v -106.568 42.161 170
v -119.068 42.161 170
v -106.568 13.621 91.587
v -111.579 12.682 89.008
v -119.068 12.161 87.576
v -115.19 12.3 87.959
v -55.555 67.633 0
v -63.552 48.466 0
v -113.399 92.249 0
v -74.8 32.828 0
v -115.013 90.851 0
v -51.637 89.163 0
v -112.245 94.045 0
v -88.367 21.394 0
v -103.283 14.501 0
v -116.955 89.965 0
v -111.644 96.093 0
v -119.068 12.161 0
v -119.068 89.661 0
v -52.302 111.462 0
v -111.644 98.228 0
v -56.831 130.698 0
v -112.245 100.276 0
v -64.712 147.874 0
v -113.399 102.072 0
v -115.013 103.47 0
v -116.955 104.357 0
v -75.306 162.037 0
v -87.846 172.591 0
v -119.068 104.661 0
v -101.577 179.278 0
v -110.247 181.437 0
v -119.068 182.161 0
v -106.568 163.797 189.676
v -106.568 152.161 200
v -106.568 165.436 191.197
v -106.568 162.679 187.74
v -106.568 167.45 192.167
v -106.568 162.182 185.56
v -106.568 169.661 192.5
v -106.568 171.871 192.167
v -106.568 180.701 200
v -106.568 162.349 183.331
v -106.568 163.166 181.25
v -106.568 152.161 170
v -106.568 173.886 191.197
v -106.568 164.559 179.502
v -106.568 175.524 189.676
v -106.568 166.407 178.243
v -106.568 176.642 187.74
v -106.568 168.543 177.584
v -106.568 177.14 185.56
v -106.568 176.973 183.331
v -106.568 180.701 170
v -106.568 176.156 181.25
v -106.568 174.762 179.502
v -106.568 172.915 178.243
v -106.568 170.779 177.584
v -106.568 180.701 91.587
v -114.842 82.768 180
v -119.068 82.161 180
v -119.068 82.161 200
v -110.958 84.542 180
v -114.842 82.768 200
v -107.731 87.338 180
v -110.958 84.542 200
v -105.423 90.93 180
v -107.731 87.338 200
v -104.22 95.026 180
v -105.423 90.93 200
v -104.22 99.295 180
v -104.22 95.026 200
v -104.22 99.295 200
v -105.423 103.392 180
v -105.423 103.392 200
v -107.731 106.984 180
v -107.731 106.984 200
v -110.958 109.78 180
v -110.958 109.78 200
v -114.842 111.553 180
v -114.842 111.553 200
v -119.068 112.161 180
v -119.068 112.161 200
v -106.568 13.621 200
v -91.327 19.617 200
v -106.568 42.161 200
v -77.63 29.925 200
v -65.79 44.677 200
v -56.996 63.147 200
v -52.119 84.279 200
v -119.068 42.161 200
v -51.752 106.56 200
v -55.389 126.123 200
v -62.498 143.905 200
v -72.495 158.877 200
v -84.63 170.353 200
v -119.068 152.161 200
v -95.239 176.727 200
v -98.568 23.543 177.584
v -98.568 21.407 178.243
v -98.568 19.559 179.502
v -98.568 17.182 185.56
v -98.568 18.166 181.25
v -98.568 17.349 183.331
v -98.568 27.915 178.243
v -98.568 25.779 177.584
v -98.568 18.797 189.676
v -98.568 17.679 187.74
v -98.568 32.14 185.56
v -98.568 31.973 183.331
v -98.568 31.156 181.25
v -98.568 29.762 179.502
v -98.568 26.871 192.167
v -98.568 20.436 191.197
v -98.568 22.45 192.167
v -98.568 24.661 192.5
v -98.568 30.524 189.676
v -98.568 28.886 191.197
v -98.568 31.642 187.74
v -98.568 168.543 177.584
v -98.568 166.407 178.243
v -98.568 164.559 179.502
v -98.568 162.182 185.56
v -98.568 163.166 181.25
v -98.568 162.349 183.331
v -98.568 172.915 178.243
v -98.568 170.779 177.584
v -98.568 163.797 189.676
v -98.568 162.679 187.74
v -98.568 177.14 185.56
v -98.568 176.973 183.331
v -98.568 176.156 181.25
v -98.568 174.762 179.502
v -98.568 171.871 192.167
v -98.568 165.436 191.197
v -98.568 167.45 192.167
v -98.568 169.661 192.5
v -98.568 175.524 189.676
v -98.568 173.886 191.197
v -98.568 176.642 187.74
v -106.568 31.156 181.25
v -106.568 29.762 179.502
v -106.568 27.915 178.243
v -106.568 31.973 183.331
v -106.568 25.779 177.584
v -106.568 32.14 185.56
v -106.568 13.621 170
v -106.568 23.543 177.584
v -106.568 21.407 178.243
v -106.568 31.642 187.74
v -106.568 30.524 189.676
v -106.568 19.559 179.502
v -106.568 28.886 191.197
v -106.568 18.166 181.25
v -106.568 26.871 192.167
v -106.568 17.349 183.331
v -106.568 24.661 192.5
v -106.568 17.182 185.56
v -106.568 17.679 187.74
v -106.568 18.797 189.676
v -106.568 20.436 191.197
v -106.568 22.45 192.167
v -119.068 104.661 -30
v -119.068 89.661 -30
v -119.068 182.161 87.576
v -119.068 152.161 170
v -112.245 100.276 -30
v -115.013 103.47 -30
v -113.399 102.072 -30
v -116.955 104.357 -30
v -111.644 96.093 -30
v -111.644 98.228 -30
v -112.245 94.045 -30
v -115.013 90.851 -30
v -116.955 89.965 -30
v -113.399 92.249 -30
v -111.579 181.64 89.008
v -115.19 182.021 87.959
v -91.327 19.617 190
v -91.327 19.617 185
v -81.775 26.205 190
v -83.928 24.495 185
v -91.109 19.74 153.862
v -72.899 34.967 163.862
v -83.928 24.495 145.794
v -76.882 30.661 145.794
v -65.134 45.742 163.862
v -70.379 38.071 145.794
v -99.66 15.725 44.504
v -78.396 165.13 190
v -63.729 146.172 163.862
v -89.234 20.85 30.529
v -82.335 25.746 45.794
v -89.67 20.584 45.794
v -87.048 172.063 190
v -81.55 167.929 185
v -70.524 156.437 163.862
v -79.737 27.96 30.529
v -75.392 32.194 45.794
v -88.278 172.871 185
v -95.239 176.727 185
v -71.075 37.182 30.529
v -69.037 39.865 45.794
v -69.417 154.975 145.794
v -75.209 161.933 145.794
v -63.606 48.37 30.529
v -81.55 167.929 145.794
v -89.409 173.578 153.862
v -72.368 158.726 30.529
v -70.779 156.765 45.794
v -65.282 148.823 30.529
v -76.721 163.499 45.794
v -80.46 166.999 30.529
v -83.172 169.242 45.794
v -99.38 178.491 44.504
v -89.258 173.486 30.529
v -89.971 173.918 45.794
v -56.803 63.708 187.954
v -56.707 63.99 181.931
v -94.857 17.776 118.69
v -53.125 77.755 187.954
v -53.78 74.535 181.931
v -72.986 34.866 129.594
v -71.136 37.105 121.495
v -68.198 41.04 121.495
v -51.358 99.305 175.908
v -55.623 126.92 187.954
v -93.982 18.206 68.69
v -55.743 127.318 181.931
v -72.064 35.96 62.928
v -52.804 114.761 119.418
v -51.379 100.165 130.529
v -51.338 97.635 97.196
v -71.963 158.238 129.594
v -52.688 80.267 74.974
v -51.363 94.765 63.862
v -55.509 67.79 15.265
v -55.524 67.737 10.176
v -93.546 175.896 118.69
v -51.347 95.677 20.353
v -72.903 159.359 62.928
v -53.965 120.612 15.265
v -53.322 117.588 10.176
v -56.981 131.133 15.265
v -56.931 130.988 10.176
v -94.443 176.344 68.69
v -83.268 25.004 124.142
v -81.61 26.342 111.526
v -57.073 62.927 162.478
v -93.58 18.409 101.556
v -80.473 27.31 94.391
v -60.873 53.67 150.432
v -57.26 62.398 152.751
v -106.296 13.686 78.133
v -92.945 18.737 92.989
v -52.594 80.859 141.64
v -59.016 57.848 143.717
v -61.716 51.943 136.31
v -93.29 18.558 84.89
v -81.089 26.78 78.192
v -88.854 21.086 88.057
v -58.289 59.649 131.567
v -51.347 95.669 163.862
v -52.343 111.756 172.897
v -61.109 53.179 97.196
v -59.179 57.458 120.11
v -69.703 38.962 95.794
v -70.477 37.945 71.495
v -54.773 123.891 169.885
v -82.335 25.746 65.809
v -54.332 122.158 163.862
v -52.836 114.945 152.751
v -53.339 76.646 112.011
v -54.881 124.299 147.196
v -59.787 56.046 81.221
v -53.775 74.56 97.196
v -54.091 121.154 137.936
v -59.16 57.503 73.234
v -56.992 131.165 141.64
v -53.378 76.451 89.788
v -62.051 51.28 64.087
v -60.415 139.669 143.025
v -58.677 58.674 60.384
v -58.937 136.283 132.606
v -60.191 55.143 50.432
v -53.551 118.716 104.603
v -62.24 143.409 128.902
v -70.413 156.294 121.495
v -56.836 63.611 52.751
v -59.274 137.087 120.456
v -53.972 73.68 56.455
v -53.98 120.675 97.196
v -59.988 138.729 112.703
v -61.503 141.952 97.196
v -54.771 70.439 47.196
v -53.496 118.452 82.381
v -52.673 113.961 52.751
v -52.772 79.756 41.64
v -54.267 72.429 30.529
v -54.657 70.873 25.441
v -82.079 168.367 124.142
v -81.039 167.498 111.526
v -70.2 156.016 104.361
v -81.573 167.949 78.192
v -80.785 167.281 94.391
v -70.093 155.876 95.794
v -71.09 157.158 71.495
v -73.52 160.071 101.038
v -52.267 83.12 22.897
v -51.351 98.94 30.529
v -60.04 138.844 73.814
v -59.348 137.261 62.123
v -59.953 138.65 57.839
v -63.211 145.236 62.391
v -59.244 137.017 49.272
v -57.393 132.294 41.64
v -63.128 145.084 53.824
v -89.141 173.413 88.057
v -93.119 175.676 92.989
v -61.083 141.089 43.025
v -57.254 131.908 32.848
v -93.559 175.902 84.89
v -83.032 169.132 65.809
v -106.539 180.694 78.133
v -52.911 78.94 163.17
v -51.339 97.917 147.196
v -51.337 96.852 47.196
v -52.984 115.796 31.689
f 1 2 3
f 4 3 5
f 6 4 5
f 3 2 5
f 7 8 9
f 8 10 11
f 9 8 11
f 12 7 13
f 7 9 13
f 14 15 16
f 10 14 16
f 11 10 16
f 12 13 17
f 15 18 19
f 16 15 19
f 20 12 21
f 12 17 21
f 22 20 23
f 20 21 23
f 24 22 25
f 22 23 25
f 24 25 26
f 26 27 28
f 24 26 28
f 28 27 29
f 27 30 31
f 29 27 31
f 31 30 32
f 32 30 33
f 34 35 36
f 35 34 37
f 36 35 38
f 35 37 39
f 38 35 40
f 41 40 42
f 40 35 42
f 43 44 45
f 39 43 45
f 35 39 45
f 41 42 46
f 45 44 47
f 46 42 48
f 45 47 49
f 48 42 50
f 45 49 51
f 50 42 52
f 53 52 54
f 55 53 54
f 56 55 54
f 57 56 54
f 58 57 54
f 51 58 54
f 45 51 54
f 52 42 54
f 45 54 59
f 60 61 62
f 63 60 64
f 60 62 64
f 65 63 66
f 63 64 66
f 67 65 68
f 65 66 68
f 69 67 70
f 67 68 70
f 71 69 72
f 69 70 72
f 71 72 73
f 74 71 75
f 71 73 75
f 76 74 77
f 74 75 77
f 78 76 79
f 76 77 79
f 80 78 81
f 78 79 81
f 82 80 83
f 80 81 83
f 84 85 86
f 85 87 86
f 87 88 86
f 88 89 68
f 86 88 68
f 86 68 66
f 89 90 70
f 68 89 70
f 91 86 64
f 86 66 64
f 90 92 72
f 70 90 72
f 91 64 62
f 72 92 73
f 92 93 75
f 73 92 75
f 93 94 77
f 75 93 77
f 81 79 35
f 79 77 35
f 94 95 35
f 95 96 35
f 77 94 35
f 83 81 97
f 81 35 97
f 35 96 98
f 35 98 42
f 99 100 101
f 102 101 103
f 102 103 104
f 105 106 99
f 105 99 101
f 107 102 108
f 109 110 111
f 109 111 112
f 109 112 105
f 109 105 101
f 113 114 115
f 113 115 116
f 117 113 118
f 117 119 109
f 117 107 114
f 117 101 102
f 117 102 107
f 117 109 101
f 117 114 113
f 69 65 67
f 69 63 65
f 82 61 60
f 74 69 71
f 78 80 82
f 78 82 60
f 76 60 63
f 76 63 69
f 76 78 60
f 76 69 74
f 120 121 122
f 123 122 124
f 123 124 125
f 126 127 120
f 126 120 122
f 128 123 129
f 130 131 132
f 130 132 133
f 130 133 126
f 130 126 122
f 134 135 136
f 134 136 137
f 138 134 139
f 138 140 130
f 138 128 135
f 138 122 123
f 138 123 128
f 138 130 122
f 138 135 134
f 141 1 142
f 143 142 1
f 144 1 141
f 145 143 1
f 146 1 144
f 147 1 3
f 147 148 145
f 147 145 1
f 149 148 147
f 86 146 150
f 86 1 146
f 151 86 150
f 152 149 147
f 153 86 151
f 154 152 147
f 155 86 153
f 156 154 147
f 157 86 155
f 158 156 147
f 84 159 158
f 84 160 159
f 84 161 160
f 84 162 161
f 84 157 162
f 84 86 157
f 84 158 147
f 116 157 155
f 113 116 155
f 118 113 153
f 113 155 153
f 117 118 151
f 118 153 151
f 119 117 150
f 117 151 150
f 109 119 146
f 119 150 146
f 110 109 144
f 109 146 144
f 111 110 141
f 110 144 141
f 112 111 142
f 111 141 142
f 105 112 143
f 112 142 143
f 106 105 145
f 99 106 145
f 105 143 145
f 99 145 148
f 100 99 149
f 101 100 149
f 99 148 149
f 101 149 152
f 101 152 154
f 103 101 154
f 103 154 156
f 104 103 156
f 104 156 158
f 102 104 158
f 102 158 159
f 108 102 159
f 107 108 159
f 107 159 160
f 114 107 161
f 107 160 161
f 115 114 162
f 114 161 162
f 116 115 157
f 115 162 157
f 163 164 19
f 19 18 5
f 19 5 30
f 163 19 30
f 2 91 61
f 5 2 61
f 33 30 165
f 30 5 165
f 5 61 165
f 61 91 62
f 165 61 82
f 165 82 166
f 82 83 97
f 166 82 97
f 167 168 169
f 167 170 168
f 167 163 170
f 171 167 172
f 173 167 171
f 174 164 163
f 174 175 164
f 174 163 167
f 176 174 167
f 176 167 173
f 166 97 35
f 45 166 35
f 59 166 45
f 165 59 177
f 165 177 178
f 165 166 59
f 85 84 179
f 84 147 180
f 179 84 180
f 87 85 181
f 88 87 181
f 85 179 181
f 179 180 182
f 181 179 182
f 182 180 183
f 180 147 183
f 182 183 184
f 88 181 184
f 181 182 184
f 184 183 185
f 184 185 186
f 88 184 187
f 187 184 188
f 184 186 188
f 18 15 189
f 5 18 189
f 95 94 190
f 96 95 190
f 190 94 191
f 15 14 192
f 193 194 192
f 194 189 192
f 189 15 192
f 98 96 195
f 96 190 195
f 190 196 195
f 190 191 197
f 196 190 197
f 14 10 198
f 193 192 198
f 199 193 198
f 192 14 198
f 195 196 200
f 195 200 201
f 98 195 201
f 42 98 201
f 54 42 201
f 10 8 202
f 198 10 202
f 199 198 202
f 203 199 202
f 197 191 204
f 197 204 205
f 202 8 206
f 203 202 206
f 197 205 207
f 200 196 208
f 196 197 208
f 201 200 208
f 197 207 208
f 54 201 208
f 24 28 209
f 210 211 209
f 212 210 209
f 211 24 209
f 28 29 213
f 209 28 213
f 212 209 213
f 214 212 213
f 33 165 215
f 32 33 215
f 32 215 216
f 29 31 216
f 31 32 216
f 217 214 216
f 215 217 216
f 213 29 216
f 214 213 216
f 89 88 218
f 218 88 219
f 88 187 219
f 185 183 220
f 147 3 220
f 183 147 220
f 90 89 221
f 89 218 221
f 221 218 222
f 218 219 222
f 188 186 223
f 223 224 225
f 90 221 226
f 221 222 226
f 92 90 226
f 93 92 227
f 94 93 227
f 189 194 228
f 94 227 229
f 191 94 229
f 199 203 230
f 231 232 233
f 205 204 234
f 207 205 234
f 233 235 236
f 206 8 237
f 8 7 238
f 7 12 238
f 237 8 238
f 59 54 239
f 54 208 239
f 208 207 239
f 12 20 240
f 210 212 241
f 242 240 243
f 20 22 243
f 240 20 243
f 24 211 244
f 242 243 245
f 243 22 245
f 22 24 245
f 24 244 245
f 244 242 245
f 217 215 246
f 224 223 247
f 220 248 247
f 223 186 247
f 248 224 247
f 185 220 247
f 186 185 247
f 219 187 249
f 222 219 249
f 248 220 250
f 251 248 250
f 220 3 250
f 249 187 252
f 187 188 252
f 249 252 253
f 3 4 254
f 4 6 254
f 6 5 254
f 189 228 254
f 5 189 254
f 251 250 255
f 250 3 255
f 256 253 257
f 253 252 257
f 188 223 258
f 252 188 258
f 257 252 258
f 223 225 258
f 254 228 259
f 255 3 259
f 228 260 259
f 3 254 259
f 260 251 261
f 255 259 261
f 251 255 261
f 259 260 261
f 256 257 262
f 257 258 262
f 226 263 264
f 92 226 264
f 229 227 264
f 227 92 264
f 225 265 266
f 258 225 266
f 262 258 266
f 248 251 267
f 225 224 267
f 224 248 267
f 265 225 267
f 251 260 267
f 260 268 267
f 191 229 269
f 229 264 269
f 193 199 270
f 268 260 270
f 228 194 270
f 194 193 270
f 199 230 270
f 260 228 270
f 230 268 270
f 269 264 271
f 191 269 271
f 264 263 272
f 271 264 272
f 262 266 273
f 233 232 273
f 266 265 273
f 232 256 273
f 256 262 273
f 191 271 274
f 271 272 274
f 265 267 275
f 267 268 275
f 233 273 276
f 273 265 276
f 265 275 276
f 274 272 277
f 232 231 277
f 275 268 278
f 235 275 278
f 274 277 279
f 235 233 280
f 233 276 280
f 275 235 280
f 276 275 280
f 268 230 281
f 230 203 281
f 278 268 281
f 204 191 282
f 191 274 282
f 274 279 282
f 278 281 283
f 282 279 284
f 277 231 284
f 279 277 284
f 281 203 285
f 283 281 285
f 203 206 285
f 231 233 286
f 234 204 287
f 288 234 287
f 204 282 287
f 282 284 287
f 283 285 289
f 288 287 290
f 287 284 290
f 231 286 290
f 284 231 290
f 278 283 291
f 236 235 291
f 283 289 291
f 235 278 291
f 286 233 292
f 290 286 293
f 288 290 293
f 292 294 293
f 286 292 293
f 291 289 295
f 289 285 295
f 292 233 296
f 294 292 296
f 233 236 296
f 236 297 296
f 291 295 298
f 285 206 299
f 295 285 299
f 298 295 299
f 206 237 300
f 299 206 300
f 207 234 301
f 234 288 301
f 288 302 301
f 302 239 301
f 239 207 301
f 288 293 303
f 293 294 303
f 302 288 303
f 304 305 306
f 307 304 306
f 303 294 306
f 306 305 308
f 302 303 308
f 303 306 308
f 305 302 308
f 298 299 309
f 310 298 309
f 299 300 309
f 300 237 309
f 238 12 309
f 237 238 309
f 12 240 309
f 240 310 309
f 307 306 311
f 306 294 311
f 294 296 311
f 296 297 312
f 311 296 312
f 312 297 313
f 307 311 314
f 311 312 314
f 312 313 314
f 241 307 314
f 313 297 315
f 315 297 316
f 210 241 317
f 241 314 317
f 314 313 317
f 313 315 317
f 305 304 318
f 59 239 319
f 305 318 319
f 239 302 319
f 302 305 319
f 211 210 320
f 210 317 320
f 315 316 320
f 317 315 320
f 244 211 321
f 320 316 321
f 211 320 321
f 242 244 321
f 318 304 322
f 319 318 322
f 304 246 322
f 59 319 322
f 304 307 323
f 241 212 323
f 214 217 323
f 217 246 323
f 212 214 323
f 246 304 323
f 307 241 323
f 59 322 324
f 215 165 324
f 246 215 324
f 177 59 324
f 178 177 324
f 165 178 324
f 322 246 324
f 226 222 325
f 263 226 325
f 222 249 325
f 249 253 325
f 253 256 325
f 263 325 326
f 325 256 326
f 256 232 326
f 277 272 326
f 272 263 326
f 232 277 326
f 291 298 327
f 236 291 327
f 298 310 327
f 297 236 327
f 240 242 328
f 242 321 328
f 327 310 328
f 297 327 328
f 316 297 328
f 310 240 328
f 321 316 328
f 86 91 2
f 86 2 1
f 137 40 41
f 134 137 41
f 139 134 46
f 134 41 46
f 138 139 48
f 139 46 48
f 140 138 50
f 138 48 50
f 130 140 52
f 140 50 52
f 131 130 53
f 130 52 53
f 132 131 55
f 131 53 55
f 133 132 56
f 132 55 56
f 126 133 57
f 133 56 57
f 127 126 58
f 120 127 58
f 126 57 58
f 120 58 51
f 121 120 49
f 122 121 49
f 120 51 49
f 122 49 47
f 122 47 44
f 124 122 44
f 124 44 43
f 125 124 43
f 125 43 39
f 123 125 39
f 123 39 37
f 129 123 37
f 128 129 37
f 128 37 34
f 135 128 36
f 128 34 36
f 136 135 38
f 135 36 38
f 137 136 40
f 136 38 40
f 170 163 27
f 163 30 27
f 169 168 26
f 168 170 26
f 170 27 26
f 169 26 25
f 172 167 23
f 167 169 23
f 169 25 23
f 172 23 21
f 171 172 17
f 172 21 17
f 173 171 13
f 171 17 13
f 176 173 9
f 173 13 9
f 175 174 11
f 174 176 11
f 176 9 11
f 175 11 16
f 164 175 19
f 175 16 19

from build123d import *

# Parameters (mm, degrees)
CROQUIS1_RX             = 85
CROQUIS1_RY             = 67.73101263
SALIENTE_EXTRUIR1_DEPTH = 200
CORTAR_EXTRUIR1_DEPTH   = 100
SALIENTE_EXTRUIR2_DEPTH = 30
CROQUIS5_R              = 7.5
SALIENTE_EXTRUIR3_DEPTH = 30
CORTAR_EXTRUIR3_DEPTH   = 30
CROQUIS8_W              = 78.88877914
CROQUIS8_H              = 202.201910825
CORTAR_EXTRUIR4_DEPTH   = 348.816388214
CROQUIS9_R              = 15
CORTAR_EXTRUIR5_DEPTH   = 20
CROQUIS10_R             = 7.5
CORTAR_EXTRUIR6_DEPTH   = 8
CORTAR_EXTRUIR7_DEPTH   = 12.5


with BuildPart() as part:
    # Croquis1 → Saliente-Extruir1 (new body)
    with BuildSketch(Plane.XY):
        with Locations(Location((-119.067557665, 97.160736636), (0, 0, 90))):
            Ellipse(CROQUIS1_RX, CROQUIS1_RY)
    extrude(amount=SALIENTE_EXTRUIR1_DEPTH)

    # Croquis3 → Cortar-Extruir1 (cut)
    with BuildSketch(Plane.XY.offset(200)):
        with BuildLine():
            Line((-171.829854236, 137.159885706), (-171.829854236, 57.159885706))
            Line((-171.829854236, 57.159885706), (-178.829854236, 57.159885706))
            add(Edge.make_bspline(
                [(-178.830577491, 137.159885706), (-195.829371976, 97.159643663), (-178.829854236, 57.159885706)],
                knots=[1.080850346, 1.080850346, 1.080850346, 2.060764999, 2.060764999, 2.060764999], degree=2, weights=[1, 0.882352941, 1]))
            Line((-178.830577491, 137.159885706), (-171.829854236, 137.159885706))
        make_face()
    extrude(amount=-CORTAR_EXTRUIR1_DEPTH, mode=Mode.SUBTRACT)

    # Croquis4 → Saliente-Extruir2 (add)
    with BuildSketch(Plane.XY.offset(200)):
        with BuildLine():
            Line((-178.830577491, 137.159885706), (-171.829854236, 137.159885706))
            Line((-171.829854236, 137.159885706), (-171.829854236, 57.159885706))
            Line((-171.829854236, 57.159885706), (-178.829854236, 57.159885706))
            add(Edge.make_bspline(
                [(-178.830577491, 137.159885706), (-195.797797403, 97.186782087), (-178.829854236, 57.159885706)],
                knots=[4.219557052, 4.219557052, 4.219557052, 5.198274326, 5.198274326, 5.198274326], degree=2, weights=[1, 0.882634519, 1]))
        make_face()
    extrude(amount=-SALIENTE_EXTRUIR2_DEPTH)

    # Croquis5 → Saliente-Extruir3 (add)
    with BuildSketch(Plane(origin=(0, 0, 0), x_dir=(-1, 0, 0), z_dir=(0, 0, -1))):
        with Locations(Location((119.067557665, 97.160736636, 0), (0, 0, 180))):
            Circle(CROQUIS5_R)
    extrude(amount=SALIENTE_EXTRUIR3_DEPTH)

    # Croquis7 → Cortar-Extruir3 (cut)
    with BuildSketch(Plane.XY.offset(200)):
        with BuildLine():
            Line((-131.567557665, 42.160736636), (-106.567557665, 42.160736636))
            Line((-106.567557665, 42.160736636), (-106.567557665, 13.620827843))
            add(Edge.make_bspline(
                [(-131.567557665, 13.620827843), (-119.067557665, 10.675126293), (-106.567557665, 13.620827843)],
                knots=[6.0975677, 6.0975677, 6.0975677, 6.468802915, 6.468802915, 6.468802915], degree=2, weights=[1, 0.982822456, 1]))
            Line((-131.567557665, 13.620827843), (-131.567557665, 42.160736636))
        make_face()
        with BuildLine():
            Line((-131.567557665, 180.700645429), (-131.567557665, 152.160736636))
            Line((-131.567557665, 152.160736636), (-106.567557665, 152.160736636))
            Line((-106.567557665, 152.160736636), (-106.567557665, 180.700645429))
            add(Edge.make_bspline(
                [(-106.567557665, 180.700645429), (-119.067557665, 183.64634698), (-131.567557665, 180.700645429)],
                knots=[2.955975046, 2.955975046, 2.955975046, 3.327210261, 3.327210261, 3.327210261], degree=2, weights=[1, 0.982822456, 1]))
        make_face()
    extrude(amount=-CORTAR_EXTRUIR3_DEPTH, mode=Mode.SUBTRACT)

    # Croquis8 → Cortar-Extruir4 (cut, through all)
    with BuildSketch(Plane.XY.offset(200)):
        with Locations((-158.511947235, 101.100955412)):
            Rectangle(CROQUIS8_W, CROQUIS8_H)
    extrude(amount=-CORTAR_EXTRUIR4_DEPTH, mode=Mode.SUBTRACT)

    # Croquis9 → Cortar-Extruir5 (cut)
    with BuildSketch(Plane.XY.offset(200)):
        with Locations((-119.067557665, 97.160736636)):
            Circle(CROQUIS9_R)
    extrude(amount=-CORTAR_EXTRUIR5_DEPTH, mode=Mode.SUBTRACT)

    # Croquis10 → Cortar-Extruir6 (cut)
    with BuildSketch(Plane.ZY.offset(106.567557665)):
        with Locations((185, 169.660736636)):
            Circle(CROQUIS10_R)
        with Locations((185, 24.660736636)):
            Circle(CROQUIS10_R)
    extrude(amount=-CORTAR_EXTRUIR6_DEPTH, mode=Mode.SUBTRACT)

    # Croquis11 → Cortar-Extruir7 (cut)
    with BuildSketch(Plane.ZY.offset(119.067557665)):
        Polygon((170, 152.160736636), (81.545095526, 184.35568894), (86.604252386, 216.899683734), (170, 209.051385078), align=None)
        Polygon((170, 42.160736636), (54.164328104, 0), (170, 0), align=None)
    extrude(amount=-CORTAR_EXTRUIR7_DEPTH, mode=Mode.SUBTRACT)


solid = part.part
